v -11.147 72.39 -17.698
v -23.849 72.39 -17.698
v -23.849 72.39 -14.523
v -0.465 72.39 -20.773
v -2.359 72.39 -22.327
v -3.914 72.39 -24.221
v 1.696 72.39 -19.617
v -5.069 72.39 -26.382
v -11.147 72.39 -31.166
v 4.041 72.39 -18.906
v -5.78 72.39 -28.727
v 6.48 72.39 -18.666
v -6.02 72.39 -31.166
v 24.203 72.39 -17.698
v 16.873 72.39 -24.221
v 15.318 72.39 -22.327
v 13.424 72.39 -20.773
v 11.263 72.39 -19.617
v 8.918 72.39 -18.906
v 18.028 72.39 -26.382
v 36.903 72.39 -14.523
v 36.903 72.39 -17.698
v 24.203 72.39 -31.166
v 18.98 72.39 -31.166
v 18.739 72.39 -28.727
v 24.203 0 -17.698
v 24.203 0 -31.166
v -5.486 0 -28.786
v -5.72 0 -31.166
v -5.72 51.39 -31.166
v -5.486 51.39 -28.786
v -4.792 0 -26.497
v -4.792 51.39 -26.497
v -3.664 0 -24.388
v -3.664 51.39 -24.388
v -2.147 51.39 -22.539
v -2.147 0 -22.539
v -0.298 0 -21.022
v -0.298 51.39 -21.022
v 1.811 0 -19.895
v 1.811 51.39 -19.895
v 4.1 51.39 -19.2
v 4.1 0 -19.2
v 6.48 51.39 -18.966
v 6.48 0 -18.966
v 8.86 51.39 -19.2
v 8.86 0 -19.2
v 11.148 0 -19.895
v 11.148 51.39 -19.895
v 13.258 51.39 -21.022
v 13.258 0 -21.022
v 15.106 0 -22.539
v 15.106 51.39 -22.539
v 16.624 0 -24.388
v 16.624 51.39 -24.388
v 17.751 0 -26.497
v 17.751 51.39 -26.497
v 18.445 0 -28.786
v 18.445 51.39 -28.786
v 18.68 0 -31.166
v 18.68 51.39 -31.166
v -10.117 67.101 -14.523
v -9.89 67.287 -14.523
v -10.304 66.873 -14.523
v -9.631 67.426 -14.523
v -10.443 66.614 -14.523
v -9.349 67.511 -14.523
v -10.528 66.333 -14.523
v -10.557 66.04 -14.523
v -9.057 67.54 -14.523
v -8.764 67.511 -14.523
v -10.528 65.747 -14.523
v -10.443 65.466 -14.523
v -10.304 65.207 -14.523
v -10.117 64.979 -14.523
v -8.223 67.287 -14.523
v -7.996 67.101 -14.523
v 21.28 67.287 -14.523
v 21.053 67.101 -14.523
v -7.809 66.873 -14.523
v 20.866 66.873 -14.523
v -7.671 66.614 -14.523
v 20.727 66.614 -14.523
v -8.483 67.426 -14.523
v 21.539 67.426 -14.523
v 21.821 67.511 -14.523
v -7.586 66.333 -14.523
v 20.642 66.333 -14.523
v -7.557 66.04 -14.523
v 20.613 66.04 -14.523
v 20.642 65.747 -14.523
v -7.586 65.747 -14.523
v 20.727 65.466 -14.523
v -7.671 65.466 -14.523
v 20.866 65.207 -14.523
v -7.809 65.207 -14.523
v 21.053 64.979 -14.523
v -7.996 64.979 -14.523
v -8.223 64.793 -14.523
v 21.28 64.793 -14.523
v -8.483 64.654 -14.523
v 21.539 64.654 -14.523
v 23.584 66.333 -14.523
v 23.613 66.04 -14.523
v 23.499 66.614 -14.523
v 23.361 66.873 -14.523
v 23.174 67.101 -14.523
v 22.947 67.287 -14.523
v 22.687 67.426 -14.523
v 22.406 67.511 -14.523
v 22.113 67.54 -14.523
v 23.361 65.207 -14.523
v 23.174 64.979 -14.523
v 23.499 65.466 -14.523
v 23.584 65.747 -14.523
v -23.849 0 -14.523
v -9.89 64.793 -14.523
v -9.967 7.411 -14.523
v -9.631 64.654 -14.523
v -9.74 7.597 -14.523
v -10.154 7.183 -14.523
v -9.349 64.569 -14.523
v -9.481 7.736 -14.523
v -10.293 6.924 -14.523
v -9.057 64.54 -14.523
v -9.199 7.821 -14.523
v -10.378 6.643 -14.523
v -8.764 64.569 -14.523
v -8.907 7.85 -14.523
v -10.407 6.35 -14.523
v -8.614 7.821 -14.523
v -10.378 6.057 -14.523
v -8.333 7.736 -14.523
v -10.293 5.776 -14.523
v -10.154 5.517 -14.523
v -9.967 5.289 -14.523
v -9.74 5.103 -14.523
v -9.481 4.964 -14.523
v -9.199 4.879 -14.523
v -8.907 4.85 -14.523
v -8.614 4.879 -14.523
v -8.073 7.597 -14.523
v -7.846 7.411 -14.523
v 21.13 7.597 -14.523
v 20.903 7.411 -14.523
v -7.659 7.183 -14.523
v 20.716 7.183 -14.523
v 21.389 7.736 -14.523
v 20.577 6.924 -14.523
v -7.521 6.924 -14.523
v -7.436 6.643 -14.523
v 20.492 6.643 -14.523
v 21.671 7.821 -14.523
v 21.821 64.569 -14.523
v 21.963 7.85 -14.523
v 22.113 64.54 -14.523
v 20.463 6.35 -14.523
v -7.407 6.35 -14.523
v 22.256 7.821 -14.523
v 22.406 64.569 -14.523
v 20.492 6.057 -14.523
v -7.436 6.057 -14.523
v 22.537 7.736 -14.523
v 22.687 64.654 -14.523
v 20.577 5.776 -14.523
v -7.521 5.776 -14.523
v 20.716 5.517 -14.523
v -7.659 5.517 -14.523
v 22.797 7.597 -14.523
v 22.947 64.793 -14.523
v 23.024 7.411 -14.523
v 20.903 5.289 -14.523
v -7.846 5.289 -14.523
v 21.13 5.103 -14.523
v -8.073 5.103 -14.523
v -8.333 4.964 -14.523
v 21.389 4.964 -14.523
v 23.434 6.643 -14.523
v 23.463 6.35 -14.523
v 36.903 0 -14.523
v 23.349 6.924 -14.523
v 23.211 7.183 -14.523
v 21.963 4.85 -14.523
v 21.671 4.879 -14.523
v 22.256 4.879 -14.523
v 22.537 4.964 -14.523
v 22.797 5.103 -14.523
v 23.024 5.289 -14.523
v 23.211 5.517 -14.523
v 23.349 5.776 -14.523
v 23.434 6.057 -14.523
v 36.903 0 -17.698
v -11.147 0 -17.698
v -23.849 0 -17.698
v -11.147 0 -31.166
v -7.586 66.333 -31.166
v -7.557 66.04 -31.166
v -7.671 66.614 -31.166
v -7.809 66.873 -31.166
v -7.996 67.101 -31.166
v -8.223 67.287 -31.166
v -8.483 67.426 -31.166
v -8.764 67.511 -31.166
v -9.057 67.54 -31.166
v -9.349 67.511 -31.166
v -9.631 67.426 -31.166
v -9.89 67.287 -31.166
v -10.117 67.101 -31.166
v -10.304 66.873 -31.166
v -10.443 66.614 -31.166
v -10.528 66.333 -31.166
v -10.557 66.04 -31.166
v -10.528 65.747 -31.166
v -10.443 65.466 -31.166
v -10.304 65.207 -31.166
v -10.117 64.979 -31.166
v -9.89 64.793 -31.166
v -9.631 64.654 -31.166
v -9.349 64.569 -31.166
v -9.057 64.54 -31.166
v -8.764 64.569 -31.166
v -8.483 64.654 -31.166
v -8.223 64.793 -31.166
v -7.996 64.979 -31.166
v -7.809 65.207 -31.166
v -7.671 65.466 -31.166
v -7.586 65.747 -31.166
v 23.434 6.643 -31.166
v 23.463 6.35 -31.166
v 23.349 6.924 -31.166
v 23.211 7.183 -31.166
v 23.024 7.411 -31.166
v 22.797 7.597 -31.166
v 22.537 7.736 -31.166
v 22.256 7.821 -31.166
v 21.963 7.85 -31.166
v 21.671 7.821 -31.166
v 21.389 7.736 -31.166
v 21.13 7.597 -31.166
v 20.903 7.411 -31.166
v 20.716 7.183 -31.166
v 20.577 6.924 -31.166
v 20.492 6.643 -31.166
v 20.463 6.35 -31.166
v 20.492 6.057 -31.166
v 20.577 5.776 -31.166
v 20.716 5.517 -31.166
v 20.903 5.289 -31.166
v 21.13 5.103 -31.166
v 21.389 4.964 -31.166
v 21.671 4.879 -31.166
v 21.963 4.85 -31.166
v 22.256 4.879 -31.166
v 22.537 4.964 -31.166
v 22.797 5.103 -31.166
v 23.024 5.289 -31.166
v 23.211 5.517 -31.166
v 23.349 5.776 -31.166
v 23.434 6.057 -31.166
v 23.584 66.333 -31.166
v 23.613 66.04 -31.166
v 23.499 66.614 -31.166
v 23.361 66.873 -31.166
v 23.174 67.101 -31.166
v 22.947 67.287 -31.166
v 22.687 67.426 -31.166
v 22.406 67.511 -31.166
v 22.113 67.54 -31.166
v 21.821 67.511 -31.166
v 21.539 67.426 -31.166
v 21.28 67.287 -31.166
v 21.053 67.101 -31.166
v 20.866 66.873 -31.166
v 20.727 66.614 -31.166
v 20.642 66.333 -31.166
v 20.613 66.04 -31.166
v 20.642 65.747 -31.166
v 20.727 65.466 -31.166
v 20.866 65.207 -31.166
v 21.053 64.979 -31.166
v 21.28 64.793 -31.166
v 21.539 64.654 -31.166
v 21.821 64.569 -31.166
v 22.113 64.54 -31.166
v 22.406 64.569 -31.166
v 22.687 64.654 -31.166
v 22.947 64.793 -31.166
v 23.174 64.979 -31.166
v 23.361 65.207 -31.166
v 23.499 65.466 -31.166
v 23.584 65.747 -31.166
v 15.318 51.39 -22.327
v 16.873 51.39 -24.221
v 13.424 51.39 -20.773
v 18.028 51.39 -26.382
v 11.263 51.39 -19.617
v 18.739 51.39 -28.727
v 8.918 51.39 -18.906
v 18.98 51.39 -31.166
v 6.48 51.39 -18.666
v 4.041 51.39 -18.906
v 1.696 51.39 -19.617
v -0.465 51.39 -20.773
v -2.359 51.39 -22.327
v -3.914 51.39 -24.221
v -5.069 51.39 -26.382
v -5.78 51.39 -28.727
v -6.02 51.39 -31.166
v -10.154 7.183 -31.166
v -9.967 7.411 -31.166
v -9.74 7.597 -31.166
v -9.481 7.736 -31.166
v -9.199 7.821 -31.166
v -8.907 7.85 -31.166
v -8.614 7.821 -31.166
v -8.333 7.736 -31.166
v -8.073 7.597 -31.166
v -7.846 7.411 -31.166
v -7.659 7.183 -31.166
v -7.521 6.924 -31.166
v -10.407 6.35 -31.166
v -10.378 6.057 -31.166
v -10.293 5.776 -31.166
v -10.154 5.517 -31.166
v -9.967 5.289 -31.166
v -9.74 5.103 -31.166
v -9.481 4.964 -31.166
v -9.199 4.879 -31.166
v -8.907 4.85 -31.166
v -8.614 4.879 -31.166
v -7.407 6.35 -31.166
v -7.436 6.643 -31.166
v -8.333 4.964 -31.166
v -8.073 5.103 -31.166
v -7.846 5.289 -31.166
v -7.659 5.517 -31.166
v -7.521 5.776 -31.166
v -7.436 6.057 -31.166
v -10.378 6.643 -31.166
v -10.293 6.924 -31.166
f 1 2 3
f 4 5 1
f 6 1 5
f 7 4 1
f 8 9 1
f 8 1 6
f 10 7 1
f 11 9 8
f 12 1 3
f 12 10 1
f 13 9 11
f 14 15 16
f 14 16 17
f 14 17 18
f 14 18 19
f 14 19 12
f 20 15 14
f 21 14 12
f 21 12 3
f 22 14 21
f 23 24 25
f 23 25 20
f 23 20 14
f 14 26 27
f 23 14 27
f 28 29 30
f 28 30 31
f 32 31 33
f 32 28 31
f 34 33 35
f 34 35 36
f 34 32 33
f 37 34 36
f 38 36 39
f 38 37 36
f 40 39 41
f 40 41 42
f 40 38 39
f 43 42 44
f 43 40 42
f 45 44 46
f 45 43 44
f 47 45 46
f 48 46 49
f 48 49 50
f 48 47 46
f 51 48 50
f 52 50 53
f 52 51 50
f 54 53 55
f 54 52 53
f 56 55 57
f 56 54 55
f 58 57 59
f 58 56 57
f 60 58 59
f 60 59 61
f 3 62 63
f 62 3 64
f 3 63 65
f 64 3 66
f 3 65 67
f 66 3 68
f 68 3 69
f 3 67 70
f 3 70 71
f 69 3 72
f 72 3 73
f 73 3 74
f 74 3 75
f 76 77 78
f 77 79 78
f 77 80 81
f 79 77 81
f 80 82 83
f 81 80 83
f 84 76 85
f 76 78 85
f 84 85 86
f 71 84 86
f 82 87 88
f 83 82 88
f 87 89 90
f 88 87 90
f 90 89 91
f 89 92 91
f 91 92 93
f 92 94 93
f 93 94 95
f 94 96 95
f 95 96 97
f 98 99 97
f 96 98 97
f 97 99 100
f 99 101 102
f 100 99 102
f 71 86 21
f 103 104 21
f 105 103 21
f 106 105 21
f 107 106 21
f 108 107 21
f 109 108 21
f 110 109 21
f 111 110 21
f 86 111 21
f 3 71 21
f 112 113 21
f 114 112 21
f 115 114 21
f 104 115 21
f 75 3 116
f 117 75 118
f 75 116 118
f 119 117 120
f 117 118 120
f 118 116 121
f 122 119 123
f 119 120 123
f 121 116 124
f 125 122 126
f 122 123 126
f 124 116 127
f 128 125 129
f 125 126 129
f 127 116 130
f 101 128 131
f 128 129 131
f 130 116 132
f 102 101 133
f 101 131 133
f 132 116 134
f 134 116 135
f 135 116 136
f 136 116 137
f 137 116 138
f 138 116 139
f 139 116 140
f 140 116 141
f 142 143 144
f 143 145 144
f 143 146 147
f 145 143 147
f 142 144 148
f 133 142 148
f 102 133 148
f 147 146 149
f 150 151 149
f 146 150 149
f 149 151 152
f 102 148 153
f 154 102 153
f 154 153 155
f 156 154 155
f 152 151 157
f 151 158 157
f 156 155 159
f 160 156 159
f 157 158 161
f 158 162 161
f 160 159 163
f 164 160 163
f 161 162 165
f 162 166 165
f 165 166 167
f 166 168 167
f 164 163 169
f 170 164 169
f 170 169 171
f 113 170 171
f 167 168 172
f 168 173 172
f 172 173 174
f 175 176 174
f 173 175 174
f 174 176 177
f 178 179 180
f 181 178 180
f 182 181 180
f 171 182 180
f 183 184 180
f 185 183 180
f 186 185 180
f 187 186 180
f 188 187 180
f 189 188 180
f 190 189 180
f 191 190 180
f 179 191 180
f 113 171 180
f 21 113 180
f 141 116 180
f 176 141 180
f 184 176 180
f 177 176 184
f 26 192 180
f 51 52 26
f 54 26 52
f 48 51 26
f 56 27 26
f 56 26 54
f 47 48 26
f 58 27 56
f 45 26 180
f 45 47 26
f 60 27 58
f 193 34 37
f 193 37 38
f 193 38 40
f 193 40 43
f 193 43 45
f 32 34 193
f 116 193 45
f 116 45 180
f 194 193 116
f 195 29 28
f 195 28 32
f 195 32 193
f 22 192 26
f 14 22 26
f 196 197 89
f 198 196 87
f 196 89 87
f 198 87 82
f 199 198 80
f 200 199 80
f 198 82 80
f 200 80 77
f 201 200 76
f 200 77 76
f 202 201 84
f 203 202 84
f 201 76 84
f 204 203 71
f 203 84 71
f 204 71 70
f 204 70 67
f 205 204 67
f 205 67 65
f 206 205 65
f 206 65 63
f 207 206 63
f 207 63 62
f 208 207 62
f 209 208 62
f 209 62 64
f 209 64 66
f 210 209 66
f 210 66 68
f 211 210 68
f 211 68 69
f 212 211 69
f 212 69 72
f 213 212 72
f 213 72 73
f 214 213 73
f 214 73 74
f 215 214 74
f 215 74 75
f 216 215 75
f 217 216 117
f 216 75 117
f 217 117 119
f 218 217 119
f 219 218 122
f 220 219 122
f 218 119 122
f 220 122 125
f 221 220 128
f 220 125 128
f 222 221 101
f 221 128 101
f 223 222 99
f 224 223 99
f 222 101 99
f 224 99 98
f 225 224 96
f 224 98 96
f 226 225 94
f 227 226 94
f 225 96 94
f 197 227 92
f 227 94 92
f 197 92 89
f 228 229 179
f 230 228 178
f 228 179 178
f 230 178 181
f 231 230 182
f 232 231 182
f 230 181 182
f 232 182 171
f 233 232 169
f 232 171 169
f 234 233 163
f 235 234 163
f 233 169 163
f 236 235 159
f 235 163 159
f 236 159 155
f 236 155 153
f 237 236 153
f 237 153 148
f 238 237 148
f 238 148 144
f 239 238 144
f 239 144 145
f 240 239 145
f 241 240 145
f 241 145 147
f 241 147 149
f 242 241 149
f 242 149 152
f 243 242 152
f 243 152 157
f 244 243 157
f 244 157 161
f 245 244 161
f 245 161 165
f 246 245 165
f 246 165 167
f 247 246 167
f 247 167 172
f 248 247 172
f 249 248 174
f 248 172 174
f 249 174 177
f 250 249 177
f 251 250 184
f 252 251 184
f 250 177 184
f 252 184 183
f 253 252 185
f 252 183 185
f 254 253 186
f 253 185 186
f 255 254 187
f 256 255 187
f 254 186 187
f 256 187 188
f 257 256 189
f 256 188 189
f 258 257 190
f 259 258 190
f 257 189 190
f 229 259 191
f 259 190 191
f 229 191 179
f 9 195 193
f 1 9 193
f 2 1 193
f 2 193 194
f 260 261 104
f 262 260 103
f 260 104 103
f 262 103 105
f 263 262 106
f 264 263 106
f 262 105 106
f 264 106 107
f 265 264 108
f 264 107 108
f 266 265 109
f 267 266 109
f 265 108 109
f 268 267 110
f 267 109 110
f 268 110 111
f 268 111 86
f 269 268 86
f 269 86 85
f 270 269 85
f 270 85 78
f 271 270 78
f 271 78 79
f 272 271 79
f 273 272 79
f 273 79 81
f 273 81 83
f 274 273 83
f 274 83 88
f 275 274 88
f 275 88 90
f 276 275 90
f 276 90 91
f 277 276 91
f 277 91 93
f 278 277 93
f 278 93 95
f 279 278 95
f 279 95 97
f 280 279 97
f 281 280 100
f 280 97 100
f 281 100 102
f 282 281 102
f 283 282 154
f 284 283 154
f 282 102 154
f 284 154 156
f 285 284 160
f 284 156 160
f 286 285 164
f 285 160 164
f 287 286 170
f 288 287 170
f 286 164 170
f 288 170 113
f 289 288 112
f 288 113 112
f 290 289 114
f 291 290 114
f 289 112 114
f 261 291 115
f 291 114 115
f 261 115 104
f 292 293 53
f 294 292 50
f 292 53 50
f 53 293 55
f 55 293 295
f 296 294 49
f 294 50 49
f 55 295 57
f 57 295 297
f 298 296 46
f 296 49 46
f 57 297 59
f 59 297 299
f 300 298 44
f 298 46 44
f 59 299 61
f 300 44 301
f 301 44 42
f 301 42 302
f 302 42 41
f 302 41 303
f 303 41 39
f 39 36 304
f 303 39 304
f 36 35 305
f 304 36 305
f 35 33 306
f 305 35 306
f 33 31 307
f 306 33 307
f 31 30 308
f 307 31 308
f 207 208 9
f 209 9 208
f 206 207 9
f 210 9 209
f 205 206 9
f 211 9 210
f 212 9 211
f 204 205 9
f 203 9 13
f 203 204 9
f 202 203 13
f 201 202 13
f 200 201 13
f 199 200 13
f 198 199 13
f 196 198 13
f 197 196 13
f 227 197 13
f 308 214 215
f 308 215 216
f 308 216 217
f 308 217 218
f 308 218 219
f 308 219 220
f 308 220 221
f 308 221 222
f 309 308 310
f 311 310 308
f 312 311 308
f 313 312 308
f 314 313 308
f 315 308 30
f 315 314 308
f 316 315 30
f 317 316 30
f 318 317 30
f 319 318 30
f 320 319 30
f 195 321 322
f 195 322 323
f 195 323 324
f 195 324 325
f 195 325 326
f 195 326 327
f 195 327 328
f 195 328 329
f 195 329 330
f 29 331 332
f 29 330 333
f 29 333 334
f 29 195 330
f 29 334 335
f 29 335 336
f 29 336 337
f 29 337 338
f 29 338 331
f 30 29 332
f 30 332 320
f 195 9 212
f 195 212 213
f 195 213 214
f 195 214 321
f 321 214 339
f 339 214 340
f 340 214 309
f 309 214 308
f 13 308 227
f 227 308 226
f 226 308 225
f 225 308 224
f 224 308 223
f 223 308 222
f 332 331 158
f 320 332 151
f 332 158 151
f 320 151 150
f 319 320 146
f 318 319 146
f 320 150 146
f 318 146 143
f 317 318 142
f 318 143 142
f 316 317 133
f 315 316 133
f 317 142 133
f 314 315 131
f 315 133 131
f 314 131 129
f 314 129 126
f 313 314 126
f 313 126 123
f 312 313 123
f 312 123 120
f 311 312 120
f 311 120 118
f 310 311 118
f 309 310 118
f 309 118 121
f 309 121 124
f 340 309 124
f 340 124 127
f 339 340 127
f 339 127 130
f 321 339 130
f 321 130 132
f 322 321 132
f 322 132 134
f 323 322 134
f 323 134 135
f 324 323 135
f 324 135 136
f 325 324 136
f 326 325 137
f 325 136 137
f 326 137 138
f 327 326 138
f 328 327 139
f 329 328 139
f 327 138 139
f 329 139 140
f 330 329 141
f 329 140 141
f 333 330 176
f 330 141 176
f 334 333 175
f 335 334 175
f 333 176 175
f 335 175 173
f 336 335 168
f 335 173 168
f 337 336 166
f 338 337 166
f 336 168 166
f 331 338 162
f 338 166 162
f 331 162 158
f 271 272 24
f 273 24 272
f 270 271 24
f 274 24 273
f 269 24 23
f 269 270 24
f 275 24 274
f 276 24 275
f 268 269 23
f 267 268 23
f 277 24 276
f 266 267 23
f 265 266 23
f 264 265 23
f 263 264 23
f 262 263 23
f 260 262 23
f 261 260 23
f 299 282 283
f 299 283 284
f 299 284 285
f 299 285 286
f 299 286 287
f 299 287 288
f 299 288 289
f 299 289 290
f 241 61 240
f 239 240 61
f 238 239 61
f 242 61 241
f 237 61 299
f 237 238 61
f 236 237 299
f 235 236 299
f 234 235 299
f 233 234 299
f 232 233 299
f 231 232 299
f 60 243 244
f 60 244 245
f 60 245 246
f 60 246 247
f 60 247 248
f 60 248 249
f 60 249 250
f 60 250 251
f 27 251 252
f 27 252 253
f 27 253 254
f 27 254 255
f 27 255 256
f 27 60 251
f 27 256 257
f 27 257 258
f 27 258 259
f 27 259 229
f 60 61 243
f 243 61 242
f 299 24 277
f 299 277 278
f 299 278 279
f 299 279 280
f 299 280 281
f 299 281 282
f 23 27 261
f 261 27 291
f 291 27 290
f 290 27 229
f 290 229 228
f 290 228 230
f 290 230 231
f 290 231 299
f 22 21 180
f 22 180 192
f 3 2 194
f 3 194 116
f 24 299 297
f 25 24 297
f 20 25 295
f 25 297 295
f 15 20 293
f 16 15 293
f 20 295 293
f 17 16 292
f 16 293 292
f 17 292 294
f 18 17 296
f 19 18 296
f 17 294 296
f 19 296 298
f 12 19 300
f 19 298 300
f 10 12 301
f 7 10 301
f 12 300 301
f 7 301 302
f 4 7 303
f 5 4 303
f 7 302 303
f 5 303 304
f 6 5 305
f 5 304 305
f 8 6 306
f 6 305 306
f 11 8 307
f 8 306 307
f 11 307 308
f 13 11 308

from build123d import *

# Parameters (mm, degrees)
BOSS_EXTRUDE3_DEPTH   = 72.39
BOSS_EXTRUDE4_DEPTH   = 51.39
F_3_0MM_DOWEL_HOLE4_D = 3


with BuildPart() as part:
    # Sketch1 → Boss-Extrude3 (new body)
    with BuildSketch(Plane(origin=(0, 0, 0), x_dir=(1, 0, 0), z_dir=(0, 1, 0))):
        with BuildLine():
            Line((-11.1466884, 17.698170271), (-23.8485284, 17.698170271))
            Line((-23.8485284, 17.698170271), (-23.8485284, 14.523170271))
            Line((-23.8485284, 14.523170271), (36.9033116, 14.523170271))
            Line((36.9033116, 14.523170271), (36.9033116, 17.698170271))
            Line((36.9033116, 17.698170271), (24.2033116, 17.698170271))
            Line((24.2033116, 17.698170271), (24.2033116, 31.16592192))
            Line((24.2033116, 31.16592192), (18.979662229, 31.16592192))
            ThreePointArc((18.979662229, 31.16592192), (6.479662229, 18.665921919), (-6.020337771, 31.16592192))
            Line((-6.020337771, 31.16592192), (-11.1466884, 31.16592192))
            Line((-11.1466884, 31.16592192), (-11.1466884, 17.698170271))
        make_face()
    extrude(amount=BOSS_EXTRUDE3_DEPTH)

    # Sketch1<13> → Boss-Extrude4 (add)
    with BuildSketch(Plane(origin=(0, 0, 0), x_dir=(1, 0, 0), z_dir=(0, 1, 0))):
        with BuildLine():
            Line((-6.020337771, 31.16592192), (-5.720337771, 31.16592192))
            ThreePointArc((-5.720337771, 31.16592192), (6.479662229, 18.965921919), (18.679662229, 31.16592192))
            Line((18.679662229, 31.16592192), (18.979662229, 31.16592192))
            ThreePointArc((18.979662229, 31.16592192), (6.479662229, 18.665921919), (-6.020337771, 31.16592192))
        make_face()
    extrude(amount=BOSS_EXTRUDE4_DEPTH)

    # Ø3.0mm Dowel Hole4 (through all)
    with Locations(Plane(origin=(0, 0, -31.16592192), x_dir=(-1, 0, 0), z_dir=(0, 0, -1))):
        with Locations((-22.1133116, 66.04), (9.0566884, 66.04), (8.9066884, 6.35), (-21.9633116, 6.35)):
            Hole(F_3_0MM_DOWEL_HOLE4_D / 2)


solid = part.part
